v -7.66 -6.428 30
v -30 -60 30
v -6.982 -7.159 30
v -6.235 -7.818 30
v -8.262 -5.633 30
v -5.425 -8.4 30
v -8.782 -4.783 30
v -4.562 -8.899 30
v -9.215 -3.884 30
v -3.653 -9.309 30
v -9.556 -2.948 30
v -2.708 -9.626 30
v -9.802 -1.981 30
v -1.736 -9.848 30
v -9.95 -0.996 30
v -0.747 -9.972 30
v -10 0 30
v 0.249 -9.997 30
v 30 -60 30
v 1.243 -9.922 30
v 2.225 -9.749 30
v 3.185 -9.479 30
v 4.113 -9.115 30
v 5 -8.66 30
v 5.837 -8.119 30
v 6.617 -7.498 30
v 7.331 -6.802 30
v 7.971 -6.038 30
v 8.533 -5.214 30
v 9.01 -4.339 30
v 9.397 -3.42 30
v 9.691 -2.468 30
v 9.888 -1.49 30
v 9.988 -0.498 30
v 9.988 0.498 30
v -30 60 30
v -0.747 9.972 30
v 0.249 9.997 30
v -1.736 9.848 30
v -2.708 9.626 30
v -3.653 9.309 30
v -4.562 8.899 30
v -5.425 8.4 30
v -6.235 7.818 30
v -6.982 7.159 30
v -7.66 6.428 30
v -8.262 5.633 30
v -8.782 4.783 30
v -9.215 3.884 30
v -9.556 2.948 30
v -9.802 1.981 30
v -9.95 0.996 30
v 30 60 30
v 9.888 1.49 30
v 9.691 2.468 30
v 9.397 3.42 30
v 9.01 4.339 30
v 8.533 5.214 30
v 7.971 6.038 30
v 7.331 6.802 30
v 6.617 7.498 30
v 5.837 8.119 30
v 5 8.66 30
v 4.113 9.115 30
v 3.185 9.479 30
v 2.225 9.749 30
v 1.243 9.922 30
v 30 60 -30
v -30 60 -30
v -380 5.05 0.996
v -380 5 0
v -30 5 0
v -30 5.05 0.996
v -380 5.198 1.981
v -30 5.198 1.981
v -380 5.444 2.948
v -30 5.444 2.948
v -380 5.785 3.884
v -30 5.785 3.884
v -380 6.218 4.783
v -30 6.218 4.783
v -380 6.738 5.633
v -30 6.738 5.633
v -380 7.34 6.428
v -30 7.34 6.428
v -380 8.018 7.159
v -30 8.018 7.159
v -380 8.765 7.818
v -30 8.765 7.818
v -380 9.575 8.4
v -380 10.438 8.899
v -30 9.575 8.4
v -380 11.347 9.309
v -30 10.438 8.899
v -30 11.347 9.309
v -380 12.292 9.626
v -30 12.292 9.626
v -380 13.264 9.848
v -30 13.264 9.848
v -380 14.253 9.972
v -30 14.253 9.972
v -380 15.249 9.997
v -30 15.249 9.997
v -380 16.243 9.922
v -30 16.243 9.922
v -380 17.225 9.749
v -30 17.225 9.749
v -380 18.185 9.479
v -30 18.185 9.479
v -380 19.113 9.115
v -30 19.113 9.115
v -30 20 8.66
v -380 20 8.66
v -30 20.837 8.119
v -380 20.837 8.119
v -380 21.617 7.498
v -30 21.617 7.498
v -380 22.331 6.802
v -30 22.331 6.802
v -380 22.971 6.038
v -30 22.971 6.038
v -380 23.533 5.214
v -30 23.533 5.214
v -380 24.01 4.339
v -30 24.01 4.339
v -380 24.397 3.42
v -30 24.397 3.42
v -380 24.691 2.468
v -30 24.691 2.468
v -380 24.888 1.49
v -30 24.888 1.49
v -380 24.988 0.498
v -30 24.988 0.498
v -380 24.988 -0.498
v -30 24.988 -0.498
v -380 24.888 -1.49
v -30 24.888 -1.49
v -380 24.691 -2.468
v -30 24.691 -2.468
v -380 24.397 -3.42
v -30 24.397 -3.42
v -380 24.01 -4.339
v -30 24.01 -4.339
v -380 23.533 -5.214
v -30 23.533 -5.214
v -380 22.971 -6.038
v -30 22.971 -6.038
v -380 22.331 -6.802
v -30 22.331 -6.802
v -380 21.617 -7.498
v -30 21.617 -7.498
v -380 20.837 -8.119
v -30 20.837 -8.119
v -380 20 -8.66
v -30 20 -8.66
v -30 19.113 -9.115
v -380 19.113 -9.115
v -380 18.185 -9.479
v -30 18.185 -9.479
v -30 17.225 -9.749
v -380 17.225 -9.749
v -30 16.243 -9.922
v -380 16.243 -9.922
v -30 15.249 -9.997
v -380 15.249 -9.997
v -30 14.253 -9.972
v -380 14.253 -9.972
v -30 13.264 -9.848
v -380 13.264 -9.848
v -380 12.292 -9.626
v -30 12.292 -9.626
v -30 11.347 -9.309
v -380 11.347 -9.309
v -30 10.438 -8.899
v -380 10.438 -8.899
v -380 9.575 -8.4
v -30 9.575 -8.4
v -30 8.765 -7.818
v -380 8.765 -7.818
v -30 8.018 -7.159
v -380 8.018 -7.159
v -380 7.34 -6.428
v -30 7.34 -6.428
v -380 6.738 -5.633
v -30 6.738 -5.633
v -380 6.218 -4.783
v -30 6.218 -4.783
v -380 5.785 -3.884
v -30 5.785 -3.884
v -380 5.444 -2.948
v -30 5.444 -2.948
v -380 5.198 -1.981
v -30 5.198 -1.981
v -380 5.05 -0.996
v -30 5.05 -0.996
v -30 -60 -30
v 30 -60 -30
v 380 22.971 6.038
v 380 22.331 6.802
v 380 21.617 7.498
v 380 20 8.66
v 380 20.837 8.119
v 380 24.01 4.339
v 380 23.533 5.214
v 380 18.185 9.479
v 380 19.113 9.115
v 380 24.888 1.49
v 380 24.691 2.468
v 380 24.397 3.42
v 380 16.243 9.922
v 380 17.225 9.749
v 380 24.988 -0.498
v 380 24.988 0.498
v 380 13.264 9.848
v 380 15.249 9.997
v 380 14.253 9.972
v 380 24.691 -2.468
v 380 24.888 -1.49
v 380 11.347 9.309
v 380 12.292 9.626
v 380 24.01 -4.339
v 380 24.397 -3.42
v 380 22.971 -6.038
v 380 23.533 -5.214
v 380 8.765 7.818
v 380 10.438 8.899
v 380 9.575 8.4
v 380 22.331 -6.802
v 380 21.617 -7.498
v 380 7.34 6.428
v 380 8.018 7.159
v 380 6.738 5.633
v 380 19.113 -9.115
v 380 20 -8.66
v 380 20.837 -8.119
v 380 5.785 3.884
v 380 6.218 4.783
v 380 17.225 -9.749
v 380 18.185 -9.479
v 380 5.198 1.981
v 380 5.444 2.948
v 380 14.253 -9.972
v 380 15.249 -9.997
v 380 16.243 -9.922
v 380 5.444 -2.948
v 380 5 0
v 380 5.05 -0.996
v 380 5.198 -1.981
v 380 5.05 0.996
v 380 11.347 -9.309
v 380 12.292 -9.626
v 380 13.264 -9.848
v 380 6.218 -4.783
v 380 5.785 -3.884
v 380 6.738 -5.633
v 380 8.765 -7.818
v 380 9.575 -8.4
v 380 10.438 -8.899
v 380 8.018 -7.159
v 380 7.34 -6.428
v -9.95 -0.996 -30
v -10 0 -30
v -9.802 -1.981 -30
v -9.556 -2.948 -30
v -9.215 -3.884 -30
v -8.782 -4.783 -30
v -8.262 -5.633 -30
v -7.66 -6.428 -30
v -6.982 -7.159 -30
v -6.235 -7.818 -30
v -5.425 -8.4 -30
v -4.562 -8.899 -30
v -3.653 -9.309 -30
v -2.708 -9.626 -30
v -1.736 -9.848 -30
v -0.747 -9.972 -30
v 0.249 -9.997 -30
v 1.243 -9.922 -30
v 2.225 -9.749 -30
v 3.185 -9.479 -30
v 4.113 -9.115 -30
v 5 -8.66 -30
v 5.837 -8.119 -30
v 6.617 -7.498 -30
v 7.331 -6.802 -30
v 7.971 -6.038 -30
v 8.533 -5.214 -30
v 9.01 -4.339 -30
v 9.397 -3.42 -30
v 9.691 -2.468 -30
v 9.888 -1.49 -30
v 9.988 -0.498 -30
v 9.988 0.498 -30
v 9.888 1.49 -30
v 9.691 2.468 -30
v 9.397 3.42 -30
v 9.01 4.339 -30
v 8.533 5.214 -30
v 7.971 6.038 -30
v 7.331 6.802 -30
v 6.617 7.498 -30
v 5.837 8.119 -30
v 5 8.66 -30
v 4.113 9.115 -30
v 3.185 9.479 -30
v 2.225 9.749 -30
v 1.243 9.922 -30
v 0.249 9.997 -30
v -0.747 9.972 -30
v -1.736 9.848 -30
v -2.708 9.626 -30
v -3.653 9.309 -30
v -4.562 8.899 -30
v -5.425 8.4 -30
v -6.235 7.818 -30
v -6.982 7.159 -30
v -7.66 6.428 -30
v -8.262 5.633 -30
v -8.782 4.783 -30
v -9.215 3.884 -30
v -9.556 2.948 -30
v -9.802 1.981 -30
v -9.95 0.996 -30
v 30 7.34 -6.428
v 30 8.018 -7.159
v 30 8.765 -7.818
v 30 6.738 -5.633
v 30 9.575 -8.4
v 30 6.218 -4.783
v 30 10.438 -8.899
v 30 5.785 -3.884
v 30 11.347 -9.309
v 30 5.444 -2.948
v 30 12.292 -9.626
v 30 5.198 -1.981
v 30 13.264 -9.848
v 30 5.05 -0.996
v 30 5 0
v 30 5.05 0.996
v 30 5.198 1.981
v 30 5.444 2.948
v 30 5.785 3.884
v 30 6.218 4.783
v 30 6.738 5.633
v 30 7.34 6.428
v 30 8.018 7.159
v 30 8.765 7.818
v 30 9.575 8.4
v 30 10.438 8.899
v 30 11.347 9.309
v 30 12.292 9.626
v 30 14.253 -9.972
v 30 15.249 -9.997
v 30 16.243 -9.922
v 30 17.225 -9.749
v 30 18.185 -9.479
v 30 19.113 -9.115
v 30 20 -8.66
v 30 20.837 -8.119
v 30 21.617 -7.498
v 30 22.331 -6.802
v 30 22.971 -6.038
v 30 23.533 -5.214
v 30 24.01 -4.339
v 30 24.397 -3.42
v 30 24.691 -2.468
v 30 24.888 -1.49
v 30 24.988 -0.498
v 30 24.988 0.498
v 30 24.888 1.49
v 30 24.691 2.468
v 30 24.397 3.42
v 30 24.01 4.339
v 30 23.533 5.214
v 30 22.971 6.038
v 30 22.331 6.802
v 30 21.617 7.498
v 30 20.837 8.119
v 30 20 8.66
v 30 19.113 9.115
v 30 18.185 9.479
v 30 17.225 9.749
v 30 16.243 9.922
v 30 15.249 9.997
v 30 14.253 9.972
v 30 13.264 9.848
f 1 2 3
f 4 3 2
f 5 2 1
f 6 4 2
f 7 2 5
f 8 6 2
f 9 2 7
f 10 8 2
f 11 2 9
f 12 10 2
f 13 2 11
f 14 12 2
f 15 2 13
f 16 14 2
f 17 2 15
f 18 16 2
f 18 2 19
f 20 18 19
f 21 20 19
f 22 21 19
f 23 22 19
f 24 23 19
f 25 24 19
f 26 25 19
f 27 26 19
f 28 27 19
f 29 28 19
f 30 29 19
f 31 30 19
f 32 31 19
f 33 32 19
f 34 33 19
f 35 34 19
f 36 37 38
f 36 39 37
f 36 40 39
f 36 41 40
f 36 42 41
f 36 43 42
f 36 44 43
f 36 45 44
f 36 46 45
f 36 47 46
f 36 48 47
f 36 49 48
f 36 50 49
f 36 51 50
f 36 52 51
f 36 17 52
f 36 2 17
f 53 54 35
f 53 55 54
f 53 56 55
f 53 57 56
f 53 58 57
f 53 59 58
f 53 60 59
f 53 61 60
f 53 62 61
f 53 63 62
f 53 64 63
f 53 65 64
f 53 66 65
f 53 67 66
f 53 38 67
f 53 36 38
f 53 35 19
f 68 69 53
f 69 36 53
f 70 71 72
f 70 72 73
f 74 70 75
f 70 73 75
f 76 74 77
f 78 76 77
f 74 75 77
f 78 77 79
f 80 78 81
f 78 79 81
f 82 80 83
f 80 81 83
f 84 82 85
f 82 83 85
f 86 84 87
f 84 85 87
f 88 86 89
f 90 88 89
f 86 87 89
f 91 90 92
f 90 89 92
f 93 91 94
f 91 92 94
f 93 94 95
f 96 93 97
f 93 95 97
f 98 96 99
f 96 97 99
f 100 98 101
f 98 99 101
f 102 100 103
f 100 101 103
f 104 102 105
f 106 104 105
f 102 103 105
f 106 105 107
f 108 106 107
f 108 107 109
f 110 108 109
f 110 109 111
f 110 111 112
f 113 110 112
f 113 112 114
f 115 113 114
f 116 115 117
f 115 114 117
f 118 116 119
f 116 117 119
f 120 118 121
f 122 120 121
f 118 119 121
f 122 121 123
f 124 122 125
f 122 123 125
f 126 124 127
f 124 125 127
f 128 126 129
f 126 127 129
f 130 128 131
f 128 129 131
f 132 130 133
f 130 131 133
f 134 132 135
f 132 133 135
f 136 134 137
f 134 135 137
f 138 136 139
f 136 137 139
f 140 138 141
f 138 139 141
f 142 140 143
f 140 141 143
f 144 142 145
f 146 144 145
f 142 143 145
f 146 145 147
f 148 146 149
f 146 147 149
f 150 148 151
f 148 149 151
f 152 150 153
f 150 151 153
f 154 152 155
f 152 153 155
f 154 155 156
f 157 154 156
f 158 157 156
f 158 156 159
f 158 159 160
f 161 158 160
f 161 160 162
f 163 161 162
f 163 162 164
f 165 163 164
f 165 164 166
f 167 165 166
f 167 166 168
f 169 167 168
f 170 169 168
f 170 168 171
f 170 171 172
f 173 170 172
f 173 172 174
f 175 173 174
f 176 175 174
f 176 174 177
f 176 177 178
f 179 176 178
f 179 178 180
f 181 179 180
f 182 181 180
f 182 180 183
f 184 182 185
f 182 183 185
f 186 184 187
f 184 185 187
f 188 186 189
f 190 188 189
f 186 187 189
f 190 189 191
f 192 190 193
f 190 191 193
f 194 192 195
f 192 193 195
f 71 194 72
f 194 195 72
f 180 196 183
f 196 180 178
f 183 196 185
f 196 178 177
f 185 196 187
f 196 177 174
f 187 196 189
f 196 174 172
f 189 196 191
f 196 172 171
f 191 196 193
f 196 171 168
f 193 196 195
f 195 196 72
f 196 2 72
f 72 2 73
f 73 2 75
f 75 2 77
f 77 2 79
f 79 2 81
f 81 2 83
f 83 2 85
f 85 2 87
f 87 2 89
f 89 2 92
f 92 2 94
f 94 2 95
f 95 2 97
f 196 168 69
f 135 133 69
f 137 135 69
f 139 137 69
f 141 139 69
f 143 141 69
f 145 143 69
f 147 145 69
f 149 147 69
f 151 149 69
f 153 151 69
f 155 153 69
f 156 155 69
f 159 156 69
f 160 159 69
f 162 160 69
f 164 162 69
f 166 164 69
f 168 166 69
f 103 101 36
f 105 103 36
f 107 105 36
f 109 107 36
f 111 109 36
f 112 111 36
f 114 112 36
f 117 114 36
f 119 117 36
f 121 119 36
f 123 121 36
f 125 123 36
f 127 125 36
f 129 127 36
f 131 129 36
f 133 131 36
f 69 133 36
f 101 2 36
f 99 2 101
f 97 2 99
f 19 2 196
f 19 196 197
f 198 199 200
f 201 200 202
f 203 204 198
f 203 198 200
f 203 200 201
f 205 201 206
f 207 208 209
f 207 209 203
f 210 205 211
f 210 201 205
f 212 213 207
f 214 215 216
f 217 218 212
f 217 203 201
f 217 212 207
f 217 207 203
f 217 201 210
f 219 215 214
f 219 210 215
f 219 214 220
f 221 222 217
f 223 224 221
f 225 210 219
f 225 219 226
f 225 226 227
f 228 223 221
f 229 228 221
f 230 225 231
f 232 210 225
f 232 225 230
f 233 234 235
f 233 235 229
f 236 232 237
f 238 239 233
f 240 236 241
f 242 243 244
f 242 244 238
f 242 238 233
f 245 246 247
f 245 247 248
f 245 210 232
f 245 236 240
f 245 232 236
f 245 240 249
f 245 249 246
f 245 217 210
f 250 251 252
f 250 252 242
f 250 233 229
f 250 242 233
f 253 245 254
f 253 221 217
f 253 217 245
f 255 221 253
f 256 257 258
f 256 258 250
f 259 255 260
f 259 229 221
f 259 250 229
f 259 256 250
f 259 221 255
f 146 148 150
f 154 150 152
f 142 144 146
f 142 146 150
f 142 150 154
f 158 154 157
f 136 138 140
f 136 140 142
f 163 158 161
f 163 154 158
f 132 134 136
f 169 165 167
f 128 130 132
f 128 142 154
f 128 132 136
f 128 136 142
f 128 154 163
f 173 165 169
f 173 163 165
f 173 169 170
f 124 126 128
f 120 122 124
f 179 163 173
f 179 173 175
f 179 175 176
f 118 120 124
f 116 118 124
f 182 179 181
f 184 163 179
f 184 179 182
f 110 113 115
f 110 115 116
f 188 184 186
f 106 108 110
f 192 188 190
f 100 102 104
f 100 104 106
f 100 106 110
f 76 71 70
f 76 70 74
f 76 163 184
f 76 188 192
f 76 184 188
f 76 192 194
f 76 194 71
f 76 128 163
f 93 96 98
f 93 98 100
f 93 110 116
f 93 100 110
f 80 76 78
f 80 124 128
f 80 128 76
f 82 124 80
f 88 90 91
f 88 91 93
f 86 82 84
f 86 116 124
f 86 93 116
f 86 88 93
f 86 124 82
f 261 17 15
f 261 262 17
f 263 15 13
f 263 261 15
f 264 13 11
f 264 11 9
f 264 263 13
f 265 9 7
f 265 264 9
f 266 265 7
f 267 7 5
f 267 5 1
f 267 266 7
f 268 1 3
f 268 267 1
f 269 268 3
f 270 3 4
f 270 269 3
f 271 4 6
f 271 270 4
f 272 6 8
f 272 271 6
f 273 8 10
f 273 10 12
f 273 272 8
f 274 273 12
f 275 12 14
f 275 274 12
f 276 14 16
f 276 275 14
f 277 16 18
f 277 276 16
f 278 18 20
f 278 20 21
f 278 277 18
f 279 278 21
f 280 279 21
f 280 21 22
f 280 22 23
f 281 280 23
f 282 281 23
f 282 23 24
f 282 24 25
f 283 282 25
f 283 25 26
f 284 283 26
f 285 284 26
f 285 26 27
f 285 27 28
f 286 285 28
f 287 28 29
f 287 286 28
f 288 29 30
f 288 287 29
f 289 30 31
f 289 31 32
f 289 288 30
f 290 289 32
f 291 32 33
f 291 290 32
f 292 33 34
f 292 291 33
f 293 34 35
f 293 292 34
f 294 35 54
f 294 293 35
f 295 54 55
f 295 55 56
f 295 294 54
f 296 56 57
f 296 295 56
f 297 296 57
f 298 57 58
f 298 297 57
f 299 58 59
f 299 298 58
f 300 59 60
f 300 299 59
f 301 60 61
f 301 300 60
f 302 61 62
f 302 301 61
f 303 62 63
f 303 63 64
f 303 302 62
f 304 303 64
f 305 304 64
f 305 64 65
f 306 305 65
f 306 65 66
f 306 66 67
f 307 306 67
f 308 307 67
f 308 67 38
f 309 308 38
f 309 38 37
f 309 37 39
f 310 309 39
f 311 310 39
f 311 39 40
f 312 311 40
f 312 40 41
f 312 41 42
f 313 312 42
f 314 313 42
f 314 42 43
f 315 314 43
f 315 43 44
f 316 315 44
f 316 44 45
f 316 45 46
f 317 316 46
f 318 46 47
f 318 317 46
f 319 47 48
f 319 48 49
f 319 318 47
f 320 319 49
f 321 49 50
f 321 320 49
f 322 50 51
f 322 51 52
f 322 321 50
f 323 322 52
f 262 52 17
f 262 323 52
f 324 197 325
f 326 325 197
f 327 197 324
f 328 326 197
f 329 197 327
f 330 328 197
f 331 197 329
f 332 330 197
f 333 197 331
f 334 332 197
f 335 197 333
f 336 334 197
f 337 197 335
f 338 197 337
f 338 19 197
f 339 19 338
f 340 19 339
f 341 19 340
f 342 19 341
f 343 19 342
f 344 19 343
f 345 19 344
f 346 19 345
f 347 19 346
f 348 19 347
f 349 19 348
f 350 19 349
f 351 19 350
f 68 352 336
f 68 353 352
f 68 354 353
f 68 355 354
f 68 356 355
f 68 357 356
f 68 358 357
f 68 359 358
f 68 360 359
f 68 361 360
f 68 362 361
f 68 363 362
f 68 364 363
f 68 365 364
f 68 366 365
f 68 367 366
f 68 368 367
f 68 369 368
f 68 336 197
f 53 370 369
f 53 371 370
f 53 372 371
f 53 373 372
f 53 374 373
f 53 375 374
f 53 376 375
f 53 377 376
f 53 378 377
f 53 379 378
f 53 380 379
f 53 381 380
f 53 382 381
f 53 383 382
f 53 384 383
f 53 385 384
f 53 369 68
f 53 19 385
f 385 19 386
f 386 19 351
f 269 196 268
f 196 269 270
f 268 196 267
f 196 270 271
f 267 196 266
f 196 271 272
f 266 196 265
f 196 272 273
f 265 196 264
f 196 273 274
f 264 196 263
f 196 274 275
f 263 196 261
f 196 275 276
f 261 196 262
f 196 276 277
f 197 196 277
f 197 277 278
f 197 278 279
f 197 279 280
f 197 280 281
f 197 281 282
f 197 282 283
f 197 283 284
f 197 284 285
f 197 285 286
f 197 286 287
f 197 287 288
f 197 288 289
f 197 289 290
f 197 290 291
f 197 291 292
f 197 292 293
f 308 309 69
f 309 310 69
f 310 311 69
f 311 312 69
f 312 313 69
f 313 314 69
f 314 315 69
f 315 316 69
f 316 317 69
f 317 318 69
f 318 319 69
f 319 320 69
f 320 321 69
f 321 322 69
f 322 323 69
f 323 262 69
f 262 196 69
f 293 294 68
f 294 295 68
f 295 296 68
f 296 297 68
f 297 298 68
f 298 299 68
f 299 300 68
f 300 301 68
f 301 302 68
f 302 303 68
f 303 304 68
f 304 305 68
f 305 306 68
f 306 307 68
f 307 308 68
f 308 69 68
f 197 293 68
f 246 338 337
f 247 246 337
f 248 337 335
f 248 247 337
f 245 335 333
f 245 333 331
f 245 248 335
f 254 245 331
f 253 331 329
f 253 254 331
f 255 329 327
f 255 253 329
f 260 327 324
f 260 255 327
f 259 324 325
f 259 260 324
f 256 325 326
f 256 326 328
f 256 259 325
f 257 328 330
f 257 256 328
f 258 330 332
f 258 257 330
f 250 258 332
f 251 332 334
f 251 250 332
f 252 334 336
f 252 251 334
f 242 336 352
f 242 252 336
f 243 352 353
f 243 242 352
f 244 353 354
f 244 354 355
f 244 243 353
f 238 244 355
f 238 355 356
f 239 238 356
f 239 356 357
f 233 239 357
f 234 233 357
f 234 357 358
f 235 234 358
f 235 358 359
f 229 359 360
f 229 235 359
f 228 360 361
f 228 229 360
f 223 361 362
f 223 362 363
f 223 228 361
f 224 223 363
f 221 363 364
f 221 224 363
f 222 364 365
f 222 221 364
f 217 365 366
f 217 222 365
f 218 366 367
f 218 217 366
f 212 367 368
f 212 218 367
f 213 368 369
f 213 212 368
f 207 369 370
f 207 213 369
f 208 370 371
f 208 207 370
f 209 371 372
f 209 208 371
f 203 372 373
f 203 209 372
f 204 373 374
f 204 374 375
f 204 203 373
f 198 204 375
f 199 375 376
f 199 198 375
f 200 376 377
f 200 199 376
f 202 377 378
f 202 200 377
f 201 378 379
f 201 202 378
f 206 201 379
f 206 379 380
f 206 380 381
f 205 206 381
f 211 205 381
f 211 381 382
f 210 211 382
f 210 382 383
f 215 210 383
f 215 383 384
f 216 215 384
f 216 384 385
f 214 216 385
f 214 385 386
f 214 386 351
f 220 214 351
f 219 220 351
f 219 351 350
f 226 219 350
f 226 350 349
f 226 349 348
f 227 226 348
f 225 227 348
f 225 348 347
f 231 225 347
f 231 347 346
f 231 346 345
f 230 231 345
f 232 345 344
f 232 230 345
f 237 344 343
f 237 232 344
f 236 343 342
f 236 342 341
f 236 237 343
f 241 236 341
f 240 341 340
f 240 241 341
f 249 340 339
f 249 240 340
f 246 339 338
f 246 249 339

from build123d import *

# Parameters (mm, degrees)
SKETCH_1_W      = 60
SKETCH_1_H      = 120
SKETCH_1_R      = 10
EXTRUDE_1_DEPTH = 30
SKETCH_2_R      = 10
EXTRUDE_2_DEPTH = 350
EXTRUDE_START   = 350
SKETCH_3_R      = 10
EXTRUDE_3_DEPTH = 350


with BuildPart() as part:
    # Эскиз1 → Бобышка-Вытянуть1 (new, symmetric)
    with BuildSketch(Plane.XY):
        Rectangle(SKETCH_1_W, SKETCH_1_H)
        with Locations(Location((0, 0, 0), (0, 0, 180))):
            Circle(SKETCH_1_R, mode=Mode.SUBTRACT)
    extrude(amount=EXTRUDE_1_DEPTH, both=True)

    # Эскиз2 → Бобышка-Вытянуть2 (add)
    with BuildSketch(Plane.ZY.offset(30)):
        with Locations(Location((0, 15, 0), (0, 0, 270))):
            Circle(SKETCH_2_R)
    extrude(amount=EXTRUDE_2_DEPTH)

    # Эскиз3 → Бобышка-Вытянуть3 (add)
    with BuildSketch(Plane(origin=(30, 0, 0), x_dir=(0, 0, -1), z_dir=(1, 0, 0)).offset(EXTRUDE_START)):
        with Locations(Location((0, 15, 0), (0, 0, 270))):
            Circle(SKETCH_3_R)
    extrude(amount=-EXTRUDE_3_DEPTH)


solid = part.part
